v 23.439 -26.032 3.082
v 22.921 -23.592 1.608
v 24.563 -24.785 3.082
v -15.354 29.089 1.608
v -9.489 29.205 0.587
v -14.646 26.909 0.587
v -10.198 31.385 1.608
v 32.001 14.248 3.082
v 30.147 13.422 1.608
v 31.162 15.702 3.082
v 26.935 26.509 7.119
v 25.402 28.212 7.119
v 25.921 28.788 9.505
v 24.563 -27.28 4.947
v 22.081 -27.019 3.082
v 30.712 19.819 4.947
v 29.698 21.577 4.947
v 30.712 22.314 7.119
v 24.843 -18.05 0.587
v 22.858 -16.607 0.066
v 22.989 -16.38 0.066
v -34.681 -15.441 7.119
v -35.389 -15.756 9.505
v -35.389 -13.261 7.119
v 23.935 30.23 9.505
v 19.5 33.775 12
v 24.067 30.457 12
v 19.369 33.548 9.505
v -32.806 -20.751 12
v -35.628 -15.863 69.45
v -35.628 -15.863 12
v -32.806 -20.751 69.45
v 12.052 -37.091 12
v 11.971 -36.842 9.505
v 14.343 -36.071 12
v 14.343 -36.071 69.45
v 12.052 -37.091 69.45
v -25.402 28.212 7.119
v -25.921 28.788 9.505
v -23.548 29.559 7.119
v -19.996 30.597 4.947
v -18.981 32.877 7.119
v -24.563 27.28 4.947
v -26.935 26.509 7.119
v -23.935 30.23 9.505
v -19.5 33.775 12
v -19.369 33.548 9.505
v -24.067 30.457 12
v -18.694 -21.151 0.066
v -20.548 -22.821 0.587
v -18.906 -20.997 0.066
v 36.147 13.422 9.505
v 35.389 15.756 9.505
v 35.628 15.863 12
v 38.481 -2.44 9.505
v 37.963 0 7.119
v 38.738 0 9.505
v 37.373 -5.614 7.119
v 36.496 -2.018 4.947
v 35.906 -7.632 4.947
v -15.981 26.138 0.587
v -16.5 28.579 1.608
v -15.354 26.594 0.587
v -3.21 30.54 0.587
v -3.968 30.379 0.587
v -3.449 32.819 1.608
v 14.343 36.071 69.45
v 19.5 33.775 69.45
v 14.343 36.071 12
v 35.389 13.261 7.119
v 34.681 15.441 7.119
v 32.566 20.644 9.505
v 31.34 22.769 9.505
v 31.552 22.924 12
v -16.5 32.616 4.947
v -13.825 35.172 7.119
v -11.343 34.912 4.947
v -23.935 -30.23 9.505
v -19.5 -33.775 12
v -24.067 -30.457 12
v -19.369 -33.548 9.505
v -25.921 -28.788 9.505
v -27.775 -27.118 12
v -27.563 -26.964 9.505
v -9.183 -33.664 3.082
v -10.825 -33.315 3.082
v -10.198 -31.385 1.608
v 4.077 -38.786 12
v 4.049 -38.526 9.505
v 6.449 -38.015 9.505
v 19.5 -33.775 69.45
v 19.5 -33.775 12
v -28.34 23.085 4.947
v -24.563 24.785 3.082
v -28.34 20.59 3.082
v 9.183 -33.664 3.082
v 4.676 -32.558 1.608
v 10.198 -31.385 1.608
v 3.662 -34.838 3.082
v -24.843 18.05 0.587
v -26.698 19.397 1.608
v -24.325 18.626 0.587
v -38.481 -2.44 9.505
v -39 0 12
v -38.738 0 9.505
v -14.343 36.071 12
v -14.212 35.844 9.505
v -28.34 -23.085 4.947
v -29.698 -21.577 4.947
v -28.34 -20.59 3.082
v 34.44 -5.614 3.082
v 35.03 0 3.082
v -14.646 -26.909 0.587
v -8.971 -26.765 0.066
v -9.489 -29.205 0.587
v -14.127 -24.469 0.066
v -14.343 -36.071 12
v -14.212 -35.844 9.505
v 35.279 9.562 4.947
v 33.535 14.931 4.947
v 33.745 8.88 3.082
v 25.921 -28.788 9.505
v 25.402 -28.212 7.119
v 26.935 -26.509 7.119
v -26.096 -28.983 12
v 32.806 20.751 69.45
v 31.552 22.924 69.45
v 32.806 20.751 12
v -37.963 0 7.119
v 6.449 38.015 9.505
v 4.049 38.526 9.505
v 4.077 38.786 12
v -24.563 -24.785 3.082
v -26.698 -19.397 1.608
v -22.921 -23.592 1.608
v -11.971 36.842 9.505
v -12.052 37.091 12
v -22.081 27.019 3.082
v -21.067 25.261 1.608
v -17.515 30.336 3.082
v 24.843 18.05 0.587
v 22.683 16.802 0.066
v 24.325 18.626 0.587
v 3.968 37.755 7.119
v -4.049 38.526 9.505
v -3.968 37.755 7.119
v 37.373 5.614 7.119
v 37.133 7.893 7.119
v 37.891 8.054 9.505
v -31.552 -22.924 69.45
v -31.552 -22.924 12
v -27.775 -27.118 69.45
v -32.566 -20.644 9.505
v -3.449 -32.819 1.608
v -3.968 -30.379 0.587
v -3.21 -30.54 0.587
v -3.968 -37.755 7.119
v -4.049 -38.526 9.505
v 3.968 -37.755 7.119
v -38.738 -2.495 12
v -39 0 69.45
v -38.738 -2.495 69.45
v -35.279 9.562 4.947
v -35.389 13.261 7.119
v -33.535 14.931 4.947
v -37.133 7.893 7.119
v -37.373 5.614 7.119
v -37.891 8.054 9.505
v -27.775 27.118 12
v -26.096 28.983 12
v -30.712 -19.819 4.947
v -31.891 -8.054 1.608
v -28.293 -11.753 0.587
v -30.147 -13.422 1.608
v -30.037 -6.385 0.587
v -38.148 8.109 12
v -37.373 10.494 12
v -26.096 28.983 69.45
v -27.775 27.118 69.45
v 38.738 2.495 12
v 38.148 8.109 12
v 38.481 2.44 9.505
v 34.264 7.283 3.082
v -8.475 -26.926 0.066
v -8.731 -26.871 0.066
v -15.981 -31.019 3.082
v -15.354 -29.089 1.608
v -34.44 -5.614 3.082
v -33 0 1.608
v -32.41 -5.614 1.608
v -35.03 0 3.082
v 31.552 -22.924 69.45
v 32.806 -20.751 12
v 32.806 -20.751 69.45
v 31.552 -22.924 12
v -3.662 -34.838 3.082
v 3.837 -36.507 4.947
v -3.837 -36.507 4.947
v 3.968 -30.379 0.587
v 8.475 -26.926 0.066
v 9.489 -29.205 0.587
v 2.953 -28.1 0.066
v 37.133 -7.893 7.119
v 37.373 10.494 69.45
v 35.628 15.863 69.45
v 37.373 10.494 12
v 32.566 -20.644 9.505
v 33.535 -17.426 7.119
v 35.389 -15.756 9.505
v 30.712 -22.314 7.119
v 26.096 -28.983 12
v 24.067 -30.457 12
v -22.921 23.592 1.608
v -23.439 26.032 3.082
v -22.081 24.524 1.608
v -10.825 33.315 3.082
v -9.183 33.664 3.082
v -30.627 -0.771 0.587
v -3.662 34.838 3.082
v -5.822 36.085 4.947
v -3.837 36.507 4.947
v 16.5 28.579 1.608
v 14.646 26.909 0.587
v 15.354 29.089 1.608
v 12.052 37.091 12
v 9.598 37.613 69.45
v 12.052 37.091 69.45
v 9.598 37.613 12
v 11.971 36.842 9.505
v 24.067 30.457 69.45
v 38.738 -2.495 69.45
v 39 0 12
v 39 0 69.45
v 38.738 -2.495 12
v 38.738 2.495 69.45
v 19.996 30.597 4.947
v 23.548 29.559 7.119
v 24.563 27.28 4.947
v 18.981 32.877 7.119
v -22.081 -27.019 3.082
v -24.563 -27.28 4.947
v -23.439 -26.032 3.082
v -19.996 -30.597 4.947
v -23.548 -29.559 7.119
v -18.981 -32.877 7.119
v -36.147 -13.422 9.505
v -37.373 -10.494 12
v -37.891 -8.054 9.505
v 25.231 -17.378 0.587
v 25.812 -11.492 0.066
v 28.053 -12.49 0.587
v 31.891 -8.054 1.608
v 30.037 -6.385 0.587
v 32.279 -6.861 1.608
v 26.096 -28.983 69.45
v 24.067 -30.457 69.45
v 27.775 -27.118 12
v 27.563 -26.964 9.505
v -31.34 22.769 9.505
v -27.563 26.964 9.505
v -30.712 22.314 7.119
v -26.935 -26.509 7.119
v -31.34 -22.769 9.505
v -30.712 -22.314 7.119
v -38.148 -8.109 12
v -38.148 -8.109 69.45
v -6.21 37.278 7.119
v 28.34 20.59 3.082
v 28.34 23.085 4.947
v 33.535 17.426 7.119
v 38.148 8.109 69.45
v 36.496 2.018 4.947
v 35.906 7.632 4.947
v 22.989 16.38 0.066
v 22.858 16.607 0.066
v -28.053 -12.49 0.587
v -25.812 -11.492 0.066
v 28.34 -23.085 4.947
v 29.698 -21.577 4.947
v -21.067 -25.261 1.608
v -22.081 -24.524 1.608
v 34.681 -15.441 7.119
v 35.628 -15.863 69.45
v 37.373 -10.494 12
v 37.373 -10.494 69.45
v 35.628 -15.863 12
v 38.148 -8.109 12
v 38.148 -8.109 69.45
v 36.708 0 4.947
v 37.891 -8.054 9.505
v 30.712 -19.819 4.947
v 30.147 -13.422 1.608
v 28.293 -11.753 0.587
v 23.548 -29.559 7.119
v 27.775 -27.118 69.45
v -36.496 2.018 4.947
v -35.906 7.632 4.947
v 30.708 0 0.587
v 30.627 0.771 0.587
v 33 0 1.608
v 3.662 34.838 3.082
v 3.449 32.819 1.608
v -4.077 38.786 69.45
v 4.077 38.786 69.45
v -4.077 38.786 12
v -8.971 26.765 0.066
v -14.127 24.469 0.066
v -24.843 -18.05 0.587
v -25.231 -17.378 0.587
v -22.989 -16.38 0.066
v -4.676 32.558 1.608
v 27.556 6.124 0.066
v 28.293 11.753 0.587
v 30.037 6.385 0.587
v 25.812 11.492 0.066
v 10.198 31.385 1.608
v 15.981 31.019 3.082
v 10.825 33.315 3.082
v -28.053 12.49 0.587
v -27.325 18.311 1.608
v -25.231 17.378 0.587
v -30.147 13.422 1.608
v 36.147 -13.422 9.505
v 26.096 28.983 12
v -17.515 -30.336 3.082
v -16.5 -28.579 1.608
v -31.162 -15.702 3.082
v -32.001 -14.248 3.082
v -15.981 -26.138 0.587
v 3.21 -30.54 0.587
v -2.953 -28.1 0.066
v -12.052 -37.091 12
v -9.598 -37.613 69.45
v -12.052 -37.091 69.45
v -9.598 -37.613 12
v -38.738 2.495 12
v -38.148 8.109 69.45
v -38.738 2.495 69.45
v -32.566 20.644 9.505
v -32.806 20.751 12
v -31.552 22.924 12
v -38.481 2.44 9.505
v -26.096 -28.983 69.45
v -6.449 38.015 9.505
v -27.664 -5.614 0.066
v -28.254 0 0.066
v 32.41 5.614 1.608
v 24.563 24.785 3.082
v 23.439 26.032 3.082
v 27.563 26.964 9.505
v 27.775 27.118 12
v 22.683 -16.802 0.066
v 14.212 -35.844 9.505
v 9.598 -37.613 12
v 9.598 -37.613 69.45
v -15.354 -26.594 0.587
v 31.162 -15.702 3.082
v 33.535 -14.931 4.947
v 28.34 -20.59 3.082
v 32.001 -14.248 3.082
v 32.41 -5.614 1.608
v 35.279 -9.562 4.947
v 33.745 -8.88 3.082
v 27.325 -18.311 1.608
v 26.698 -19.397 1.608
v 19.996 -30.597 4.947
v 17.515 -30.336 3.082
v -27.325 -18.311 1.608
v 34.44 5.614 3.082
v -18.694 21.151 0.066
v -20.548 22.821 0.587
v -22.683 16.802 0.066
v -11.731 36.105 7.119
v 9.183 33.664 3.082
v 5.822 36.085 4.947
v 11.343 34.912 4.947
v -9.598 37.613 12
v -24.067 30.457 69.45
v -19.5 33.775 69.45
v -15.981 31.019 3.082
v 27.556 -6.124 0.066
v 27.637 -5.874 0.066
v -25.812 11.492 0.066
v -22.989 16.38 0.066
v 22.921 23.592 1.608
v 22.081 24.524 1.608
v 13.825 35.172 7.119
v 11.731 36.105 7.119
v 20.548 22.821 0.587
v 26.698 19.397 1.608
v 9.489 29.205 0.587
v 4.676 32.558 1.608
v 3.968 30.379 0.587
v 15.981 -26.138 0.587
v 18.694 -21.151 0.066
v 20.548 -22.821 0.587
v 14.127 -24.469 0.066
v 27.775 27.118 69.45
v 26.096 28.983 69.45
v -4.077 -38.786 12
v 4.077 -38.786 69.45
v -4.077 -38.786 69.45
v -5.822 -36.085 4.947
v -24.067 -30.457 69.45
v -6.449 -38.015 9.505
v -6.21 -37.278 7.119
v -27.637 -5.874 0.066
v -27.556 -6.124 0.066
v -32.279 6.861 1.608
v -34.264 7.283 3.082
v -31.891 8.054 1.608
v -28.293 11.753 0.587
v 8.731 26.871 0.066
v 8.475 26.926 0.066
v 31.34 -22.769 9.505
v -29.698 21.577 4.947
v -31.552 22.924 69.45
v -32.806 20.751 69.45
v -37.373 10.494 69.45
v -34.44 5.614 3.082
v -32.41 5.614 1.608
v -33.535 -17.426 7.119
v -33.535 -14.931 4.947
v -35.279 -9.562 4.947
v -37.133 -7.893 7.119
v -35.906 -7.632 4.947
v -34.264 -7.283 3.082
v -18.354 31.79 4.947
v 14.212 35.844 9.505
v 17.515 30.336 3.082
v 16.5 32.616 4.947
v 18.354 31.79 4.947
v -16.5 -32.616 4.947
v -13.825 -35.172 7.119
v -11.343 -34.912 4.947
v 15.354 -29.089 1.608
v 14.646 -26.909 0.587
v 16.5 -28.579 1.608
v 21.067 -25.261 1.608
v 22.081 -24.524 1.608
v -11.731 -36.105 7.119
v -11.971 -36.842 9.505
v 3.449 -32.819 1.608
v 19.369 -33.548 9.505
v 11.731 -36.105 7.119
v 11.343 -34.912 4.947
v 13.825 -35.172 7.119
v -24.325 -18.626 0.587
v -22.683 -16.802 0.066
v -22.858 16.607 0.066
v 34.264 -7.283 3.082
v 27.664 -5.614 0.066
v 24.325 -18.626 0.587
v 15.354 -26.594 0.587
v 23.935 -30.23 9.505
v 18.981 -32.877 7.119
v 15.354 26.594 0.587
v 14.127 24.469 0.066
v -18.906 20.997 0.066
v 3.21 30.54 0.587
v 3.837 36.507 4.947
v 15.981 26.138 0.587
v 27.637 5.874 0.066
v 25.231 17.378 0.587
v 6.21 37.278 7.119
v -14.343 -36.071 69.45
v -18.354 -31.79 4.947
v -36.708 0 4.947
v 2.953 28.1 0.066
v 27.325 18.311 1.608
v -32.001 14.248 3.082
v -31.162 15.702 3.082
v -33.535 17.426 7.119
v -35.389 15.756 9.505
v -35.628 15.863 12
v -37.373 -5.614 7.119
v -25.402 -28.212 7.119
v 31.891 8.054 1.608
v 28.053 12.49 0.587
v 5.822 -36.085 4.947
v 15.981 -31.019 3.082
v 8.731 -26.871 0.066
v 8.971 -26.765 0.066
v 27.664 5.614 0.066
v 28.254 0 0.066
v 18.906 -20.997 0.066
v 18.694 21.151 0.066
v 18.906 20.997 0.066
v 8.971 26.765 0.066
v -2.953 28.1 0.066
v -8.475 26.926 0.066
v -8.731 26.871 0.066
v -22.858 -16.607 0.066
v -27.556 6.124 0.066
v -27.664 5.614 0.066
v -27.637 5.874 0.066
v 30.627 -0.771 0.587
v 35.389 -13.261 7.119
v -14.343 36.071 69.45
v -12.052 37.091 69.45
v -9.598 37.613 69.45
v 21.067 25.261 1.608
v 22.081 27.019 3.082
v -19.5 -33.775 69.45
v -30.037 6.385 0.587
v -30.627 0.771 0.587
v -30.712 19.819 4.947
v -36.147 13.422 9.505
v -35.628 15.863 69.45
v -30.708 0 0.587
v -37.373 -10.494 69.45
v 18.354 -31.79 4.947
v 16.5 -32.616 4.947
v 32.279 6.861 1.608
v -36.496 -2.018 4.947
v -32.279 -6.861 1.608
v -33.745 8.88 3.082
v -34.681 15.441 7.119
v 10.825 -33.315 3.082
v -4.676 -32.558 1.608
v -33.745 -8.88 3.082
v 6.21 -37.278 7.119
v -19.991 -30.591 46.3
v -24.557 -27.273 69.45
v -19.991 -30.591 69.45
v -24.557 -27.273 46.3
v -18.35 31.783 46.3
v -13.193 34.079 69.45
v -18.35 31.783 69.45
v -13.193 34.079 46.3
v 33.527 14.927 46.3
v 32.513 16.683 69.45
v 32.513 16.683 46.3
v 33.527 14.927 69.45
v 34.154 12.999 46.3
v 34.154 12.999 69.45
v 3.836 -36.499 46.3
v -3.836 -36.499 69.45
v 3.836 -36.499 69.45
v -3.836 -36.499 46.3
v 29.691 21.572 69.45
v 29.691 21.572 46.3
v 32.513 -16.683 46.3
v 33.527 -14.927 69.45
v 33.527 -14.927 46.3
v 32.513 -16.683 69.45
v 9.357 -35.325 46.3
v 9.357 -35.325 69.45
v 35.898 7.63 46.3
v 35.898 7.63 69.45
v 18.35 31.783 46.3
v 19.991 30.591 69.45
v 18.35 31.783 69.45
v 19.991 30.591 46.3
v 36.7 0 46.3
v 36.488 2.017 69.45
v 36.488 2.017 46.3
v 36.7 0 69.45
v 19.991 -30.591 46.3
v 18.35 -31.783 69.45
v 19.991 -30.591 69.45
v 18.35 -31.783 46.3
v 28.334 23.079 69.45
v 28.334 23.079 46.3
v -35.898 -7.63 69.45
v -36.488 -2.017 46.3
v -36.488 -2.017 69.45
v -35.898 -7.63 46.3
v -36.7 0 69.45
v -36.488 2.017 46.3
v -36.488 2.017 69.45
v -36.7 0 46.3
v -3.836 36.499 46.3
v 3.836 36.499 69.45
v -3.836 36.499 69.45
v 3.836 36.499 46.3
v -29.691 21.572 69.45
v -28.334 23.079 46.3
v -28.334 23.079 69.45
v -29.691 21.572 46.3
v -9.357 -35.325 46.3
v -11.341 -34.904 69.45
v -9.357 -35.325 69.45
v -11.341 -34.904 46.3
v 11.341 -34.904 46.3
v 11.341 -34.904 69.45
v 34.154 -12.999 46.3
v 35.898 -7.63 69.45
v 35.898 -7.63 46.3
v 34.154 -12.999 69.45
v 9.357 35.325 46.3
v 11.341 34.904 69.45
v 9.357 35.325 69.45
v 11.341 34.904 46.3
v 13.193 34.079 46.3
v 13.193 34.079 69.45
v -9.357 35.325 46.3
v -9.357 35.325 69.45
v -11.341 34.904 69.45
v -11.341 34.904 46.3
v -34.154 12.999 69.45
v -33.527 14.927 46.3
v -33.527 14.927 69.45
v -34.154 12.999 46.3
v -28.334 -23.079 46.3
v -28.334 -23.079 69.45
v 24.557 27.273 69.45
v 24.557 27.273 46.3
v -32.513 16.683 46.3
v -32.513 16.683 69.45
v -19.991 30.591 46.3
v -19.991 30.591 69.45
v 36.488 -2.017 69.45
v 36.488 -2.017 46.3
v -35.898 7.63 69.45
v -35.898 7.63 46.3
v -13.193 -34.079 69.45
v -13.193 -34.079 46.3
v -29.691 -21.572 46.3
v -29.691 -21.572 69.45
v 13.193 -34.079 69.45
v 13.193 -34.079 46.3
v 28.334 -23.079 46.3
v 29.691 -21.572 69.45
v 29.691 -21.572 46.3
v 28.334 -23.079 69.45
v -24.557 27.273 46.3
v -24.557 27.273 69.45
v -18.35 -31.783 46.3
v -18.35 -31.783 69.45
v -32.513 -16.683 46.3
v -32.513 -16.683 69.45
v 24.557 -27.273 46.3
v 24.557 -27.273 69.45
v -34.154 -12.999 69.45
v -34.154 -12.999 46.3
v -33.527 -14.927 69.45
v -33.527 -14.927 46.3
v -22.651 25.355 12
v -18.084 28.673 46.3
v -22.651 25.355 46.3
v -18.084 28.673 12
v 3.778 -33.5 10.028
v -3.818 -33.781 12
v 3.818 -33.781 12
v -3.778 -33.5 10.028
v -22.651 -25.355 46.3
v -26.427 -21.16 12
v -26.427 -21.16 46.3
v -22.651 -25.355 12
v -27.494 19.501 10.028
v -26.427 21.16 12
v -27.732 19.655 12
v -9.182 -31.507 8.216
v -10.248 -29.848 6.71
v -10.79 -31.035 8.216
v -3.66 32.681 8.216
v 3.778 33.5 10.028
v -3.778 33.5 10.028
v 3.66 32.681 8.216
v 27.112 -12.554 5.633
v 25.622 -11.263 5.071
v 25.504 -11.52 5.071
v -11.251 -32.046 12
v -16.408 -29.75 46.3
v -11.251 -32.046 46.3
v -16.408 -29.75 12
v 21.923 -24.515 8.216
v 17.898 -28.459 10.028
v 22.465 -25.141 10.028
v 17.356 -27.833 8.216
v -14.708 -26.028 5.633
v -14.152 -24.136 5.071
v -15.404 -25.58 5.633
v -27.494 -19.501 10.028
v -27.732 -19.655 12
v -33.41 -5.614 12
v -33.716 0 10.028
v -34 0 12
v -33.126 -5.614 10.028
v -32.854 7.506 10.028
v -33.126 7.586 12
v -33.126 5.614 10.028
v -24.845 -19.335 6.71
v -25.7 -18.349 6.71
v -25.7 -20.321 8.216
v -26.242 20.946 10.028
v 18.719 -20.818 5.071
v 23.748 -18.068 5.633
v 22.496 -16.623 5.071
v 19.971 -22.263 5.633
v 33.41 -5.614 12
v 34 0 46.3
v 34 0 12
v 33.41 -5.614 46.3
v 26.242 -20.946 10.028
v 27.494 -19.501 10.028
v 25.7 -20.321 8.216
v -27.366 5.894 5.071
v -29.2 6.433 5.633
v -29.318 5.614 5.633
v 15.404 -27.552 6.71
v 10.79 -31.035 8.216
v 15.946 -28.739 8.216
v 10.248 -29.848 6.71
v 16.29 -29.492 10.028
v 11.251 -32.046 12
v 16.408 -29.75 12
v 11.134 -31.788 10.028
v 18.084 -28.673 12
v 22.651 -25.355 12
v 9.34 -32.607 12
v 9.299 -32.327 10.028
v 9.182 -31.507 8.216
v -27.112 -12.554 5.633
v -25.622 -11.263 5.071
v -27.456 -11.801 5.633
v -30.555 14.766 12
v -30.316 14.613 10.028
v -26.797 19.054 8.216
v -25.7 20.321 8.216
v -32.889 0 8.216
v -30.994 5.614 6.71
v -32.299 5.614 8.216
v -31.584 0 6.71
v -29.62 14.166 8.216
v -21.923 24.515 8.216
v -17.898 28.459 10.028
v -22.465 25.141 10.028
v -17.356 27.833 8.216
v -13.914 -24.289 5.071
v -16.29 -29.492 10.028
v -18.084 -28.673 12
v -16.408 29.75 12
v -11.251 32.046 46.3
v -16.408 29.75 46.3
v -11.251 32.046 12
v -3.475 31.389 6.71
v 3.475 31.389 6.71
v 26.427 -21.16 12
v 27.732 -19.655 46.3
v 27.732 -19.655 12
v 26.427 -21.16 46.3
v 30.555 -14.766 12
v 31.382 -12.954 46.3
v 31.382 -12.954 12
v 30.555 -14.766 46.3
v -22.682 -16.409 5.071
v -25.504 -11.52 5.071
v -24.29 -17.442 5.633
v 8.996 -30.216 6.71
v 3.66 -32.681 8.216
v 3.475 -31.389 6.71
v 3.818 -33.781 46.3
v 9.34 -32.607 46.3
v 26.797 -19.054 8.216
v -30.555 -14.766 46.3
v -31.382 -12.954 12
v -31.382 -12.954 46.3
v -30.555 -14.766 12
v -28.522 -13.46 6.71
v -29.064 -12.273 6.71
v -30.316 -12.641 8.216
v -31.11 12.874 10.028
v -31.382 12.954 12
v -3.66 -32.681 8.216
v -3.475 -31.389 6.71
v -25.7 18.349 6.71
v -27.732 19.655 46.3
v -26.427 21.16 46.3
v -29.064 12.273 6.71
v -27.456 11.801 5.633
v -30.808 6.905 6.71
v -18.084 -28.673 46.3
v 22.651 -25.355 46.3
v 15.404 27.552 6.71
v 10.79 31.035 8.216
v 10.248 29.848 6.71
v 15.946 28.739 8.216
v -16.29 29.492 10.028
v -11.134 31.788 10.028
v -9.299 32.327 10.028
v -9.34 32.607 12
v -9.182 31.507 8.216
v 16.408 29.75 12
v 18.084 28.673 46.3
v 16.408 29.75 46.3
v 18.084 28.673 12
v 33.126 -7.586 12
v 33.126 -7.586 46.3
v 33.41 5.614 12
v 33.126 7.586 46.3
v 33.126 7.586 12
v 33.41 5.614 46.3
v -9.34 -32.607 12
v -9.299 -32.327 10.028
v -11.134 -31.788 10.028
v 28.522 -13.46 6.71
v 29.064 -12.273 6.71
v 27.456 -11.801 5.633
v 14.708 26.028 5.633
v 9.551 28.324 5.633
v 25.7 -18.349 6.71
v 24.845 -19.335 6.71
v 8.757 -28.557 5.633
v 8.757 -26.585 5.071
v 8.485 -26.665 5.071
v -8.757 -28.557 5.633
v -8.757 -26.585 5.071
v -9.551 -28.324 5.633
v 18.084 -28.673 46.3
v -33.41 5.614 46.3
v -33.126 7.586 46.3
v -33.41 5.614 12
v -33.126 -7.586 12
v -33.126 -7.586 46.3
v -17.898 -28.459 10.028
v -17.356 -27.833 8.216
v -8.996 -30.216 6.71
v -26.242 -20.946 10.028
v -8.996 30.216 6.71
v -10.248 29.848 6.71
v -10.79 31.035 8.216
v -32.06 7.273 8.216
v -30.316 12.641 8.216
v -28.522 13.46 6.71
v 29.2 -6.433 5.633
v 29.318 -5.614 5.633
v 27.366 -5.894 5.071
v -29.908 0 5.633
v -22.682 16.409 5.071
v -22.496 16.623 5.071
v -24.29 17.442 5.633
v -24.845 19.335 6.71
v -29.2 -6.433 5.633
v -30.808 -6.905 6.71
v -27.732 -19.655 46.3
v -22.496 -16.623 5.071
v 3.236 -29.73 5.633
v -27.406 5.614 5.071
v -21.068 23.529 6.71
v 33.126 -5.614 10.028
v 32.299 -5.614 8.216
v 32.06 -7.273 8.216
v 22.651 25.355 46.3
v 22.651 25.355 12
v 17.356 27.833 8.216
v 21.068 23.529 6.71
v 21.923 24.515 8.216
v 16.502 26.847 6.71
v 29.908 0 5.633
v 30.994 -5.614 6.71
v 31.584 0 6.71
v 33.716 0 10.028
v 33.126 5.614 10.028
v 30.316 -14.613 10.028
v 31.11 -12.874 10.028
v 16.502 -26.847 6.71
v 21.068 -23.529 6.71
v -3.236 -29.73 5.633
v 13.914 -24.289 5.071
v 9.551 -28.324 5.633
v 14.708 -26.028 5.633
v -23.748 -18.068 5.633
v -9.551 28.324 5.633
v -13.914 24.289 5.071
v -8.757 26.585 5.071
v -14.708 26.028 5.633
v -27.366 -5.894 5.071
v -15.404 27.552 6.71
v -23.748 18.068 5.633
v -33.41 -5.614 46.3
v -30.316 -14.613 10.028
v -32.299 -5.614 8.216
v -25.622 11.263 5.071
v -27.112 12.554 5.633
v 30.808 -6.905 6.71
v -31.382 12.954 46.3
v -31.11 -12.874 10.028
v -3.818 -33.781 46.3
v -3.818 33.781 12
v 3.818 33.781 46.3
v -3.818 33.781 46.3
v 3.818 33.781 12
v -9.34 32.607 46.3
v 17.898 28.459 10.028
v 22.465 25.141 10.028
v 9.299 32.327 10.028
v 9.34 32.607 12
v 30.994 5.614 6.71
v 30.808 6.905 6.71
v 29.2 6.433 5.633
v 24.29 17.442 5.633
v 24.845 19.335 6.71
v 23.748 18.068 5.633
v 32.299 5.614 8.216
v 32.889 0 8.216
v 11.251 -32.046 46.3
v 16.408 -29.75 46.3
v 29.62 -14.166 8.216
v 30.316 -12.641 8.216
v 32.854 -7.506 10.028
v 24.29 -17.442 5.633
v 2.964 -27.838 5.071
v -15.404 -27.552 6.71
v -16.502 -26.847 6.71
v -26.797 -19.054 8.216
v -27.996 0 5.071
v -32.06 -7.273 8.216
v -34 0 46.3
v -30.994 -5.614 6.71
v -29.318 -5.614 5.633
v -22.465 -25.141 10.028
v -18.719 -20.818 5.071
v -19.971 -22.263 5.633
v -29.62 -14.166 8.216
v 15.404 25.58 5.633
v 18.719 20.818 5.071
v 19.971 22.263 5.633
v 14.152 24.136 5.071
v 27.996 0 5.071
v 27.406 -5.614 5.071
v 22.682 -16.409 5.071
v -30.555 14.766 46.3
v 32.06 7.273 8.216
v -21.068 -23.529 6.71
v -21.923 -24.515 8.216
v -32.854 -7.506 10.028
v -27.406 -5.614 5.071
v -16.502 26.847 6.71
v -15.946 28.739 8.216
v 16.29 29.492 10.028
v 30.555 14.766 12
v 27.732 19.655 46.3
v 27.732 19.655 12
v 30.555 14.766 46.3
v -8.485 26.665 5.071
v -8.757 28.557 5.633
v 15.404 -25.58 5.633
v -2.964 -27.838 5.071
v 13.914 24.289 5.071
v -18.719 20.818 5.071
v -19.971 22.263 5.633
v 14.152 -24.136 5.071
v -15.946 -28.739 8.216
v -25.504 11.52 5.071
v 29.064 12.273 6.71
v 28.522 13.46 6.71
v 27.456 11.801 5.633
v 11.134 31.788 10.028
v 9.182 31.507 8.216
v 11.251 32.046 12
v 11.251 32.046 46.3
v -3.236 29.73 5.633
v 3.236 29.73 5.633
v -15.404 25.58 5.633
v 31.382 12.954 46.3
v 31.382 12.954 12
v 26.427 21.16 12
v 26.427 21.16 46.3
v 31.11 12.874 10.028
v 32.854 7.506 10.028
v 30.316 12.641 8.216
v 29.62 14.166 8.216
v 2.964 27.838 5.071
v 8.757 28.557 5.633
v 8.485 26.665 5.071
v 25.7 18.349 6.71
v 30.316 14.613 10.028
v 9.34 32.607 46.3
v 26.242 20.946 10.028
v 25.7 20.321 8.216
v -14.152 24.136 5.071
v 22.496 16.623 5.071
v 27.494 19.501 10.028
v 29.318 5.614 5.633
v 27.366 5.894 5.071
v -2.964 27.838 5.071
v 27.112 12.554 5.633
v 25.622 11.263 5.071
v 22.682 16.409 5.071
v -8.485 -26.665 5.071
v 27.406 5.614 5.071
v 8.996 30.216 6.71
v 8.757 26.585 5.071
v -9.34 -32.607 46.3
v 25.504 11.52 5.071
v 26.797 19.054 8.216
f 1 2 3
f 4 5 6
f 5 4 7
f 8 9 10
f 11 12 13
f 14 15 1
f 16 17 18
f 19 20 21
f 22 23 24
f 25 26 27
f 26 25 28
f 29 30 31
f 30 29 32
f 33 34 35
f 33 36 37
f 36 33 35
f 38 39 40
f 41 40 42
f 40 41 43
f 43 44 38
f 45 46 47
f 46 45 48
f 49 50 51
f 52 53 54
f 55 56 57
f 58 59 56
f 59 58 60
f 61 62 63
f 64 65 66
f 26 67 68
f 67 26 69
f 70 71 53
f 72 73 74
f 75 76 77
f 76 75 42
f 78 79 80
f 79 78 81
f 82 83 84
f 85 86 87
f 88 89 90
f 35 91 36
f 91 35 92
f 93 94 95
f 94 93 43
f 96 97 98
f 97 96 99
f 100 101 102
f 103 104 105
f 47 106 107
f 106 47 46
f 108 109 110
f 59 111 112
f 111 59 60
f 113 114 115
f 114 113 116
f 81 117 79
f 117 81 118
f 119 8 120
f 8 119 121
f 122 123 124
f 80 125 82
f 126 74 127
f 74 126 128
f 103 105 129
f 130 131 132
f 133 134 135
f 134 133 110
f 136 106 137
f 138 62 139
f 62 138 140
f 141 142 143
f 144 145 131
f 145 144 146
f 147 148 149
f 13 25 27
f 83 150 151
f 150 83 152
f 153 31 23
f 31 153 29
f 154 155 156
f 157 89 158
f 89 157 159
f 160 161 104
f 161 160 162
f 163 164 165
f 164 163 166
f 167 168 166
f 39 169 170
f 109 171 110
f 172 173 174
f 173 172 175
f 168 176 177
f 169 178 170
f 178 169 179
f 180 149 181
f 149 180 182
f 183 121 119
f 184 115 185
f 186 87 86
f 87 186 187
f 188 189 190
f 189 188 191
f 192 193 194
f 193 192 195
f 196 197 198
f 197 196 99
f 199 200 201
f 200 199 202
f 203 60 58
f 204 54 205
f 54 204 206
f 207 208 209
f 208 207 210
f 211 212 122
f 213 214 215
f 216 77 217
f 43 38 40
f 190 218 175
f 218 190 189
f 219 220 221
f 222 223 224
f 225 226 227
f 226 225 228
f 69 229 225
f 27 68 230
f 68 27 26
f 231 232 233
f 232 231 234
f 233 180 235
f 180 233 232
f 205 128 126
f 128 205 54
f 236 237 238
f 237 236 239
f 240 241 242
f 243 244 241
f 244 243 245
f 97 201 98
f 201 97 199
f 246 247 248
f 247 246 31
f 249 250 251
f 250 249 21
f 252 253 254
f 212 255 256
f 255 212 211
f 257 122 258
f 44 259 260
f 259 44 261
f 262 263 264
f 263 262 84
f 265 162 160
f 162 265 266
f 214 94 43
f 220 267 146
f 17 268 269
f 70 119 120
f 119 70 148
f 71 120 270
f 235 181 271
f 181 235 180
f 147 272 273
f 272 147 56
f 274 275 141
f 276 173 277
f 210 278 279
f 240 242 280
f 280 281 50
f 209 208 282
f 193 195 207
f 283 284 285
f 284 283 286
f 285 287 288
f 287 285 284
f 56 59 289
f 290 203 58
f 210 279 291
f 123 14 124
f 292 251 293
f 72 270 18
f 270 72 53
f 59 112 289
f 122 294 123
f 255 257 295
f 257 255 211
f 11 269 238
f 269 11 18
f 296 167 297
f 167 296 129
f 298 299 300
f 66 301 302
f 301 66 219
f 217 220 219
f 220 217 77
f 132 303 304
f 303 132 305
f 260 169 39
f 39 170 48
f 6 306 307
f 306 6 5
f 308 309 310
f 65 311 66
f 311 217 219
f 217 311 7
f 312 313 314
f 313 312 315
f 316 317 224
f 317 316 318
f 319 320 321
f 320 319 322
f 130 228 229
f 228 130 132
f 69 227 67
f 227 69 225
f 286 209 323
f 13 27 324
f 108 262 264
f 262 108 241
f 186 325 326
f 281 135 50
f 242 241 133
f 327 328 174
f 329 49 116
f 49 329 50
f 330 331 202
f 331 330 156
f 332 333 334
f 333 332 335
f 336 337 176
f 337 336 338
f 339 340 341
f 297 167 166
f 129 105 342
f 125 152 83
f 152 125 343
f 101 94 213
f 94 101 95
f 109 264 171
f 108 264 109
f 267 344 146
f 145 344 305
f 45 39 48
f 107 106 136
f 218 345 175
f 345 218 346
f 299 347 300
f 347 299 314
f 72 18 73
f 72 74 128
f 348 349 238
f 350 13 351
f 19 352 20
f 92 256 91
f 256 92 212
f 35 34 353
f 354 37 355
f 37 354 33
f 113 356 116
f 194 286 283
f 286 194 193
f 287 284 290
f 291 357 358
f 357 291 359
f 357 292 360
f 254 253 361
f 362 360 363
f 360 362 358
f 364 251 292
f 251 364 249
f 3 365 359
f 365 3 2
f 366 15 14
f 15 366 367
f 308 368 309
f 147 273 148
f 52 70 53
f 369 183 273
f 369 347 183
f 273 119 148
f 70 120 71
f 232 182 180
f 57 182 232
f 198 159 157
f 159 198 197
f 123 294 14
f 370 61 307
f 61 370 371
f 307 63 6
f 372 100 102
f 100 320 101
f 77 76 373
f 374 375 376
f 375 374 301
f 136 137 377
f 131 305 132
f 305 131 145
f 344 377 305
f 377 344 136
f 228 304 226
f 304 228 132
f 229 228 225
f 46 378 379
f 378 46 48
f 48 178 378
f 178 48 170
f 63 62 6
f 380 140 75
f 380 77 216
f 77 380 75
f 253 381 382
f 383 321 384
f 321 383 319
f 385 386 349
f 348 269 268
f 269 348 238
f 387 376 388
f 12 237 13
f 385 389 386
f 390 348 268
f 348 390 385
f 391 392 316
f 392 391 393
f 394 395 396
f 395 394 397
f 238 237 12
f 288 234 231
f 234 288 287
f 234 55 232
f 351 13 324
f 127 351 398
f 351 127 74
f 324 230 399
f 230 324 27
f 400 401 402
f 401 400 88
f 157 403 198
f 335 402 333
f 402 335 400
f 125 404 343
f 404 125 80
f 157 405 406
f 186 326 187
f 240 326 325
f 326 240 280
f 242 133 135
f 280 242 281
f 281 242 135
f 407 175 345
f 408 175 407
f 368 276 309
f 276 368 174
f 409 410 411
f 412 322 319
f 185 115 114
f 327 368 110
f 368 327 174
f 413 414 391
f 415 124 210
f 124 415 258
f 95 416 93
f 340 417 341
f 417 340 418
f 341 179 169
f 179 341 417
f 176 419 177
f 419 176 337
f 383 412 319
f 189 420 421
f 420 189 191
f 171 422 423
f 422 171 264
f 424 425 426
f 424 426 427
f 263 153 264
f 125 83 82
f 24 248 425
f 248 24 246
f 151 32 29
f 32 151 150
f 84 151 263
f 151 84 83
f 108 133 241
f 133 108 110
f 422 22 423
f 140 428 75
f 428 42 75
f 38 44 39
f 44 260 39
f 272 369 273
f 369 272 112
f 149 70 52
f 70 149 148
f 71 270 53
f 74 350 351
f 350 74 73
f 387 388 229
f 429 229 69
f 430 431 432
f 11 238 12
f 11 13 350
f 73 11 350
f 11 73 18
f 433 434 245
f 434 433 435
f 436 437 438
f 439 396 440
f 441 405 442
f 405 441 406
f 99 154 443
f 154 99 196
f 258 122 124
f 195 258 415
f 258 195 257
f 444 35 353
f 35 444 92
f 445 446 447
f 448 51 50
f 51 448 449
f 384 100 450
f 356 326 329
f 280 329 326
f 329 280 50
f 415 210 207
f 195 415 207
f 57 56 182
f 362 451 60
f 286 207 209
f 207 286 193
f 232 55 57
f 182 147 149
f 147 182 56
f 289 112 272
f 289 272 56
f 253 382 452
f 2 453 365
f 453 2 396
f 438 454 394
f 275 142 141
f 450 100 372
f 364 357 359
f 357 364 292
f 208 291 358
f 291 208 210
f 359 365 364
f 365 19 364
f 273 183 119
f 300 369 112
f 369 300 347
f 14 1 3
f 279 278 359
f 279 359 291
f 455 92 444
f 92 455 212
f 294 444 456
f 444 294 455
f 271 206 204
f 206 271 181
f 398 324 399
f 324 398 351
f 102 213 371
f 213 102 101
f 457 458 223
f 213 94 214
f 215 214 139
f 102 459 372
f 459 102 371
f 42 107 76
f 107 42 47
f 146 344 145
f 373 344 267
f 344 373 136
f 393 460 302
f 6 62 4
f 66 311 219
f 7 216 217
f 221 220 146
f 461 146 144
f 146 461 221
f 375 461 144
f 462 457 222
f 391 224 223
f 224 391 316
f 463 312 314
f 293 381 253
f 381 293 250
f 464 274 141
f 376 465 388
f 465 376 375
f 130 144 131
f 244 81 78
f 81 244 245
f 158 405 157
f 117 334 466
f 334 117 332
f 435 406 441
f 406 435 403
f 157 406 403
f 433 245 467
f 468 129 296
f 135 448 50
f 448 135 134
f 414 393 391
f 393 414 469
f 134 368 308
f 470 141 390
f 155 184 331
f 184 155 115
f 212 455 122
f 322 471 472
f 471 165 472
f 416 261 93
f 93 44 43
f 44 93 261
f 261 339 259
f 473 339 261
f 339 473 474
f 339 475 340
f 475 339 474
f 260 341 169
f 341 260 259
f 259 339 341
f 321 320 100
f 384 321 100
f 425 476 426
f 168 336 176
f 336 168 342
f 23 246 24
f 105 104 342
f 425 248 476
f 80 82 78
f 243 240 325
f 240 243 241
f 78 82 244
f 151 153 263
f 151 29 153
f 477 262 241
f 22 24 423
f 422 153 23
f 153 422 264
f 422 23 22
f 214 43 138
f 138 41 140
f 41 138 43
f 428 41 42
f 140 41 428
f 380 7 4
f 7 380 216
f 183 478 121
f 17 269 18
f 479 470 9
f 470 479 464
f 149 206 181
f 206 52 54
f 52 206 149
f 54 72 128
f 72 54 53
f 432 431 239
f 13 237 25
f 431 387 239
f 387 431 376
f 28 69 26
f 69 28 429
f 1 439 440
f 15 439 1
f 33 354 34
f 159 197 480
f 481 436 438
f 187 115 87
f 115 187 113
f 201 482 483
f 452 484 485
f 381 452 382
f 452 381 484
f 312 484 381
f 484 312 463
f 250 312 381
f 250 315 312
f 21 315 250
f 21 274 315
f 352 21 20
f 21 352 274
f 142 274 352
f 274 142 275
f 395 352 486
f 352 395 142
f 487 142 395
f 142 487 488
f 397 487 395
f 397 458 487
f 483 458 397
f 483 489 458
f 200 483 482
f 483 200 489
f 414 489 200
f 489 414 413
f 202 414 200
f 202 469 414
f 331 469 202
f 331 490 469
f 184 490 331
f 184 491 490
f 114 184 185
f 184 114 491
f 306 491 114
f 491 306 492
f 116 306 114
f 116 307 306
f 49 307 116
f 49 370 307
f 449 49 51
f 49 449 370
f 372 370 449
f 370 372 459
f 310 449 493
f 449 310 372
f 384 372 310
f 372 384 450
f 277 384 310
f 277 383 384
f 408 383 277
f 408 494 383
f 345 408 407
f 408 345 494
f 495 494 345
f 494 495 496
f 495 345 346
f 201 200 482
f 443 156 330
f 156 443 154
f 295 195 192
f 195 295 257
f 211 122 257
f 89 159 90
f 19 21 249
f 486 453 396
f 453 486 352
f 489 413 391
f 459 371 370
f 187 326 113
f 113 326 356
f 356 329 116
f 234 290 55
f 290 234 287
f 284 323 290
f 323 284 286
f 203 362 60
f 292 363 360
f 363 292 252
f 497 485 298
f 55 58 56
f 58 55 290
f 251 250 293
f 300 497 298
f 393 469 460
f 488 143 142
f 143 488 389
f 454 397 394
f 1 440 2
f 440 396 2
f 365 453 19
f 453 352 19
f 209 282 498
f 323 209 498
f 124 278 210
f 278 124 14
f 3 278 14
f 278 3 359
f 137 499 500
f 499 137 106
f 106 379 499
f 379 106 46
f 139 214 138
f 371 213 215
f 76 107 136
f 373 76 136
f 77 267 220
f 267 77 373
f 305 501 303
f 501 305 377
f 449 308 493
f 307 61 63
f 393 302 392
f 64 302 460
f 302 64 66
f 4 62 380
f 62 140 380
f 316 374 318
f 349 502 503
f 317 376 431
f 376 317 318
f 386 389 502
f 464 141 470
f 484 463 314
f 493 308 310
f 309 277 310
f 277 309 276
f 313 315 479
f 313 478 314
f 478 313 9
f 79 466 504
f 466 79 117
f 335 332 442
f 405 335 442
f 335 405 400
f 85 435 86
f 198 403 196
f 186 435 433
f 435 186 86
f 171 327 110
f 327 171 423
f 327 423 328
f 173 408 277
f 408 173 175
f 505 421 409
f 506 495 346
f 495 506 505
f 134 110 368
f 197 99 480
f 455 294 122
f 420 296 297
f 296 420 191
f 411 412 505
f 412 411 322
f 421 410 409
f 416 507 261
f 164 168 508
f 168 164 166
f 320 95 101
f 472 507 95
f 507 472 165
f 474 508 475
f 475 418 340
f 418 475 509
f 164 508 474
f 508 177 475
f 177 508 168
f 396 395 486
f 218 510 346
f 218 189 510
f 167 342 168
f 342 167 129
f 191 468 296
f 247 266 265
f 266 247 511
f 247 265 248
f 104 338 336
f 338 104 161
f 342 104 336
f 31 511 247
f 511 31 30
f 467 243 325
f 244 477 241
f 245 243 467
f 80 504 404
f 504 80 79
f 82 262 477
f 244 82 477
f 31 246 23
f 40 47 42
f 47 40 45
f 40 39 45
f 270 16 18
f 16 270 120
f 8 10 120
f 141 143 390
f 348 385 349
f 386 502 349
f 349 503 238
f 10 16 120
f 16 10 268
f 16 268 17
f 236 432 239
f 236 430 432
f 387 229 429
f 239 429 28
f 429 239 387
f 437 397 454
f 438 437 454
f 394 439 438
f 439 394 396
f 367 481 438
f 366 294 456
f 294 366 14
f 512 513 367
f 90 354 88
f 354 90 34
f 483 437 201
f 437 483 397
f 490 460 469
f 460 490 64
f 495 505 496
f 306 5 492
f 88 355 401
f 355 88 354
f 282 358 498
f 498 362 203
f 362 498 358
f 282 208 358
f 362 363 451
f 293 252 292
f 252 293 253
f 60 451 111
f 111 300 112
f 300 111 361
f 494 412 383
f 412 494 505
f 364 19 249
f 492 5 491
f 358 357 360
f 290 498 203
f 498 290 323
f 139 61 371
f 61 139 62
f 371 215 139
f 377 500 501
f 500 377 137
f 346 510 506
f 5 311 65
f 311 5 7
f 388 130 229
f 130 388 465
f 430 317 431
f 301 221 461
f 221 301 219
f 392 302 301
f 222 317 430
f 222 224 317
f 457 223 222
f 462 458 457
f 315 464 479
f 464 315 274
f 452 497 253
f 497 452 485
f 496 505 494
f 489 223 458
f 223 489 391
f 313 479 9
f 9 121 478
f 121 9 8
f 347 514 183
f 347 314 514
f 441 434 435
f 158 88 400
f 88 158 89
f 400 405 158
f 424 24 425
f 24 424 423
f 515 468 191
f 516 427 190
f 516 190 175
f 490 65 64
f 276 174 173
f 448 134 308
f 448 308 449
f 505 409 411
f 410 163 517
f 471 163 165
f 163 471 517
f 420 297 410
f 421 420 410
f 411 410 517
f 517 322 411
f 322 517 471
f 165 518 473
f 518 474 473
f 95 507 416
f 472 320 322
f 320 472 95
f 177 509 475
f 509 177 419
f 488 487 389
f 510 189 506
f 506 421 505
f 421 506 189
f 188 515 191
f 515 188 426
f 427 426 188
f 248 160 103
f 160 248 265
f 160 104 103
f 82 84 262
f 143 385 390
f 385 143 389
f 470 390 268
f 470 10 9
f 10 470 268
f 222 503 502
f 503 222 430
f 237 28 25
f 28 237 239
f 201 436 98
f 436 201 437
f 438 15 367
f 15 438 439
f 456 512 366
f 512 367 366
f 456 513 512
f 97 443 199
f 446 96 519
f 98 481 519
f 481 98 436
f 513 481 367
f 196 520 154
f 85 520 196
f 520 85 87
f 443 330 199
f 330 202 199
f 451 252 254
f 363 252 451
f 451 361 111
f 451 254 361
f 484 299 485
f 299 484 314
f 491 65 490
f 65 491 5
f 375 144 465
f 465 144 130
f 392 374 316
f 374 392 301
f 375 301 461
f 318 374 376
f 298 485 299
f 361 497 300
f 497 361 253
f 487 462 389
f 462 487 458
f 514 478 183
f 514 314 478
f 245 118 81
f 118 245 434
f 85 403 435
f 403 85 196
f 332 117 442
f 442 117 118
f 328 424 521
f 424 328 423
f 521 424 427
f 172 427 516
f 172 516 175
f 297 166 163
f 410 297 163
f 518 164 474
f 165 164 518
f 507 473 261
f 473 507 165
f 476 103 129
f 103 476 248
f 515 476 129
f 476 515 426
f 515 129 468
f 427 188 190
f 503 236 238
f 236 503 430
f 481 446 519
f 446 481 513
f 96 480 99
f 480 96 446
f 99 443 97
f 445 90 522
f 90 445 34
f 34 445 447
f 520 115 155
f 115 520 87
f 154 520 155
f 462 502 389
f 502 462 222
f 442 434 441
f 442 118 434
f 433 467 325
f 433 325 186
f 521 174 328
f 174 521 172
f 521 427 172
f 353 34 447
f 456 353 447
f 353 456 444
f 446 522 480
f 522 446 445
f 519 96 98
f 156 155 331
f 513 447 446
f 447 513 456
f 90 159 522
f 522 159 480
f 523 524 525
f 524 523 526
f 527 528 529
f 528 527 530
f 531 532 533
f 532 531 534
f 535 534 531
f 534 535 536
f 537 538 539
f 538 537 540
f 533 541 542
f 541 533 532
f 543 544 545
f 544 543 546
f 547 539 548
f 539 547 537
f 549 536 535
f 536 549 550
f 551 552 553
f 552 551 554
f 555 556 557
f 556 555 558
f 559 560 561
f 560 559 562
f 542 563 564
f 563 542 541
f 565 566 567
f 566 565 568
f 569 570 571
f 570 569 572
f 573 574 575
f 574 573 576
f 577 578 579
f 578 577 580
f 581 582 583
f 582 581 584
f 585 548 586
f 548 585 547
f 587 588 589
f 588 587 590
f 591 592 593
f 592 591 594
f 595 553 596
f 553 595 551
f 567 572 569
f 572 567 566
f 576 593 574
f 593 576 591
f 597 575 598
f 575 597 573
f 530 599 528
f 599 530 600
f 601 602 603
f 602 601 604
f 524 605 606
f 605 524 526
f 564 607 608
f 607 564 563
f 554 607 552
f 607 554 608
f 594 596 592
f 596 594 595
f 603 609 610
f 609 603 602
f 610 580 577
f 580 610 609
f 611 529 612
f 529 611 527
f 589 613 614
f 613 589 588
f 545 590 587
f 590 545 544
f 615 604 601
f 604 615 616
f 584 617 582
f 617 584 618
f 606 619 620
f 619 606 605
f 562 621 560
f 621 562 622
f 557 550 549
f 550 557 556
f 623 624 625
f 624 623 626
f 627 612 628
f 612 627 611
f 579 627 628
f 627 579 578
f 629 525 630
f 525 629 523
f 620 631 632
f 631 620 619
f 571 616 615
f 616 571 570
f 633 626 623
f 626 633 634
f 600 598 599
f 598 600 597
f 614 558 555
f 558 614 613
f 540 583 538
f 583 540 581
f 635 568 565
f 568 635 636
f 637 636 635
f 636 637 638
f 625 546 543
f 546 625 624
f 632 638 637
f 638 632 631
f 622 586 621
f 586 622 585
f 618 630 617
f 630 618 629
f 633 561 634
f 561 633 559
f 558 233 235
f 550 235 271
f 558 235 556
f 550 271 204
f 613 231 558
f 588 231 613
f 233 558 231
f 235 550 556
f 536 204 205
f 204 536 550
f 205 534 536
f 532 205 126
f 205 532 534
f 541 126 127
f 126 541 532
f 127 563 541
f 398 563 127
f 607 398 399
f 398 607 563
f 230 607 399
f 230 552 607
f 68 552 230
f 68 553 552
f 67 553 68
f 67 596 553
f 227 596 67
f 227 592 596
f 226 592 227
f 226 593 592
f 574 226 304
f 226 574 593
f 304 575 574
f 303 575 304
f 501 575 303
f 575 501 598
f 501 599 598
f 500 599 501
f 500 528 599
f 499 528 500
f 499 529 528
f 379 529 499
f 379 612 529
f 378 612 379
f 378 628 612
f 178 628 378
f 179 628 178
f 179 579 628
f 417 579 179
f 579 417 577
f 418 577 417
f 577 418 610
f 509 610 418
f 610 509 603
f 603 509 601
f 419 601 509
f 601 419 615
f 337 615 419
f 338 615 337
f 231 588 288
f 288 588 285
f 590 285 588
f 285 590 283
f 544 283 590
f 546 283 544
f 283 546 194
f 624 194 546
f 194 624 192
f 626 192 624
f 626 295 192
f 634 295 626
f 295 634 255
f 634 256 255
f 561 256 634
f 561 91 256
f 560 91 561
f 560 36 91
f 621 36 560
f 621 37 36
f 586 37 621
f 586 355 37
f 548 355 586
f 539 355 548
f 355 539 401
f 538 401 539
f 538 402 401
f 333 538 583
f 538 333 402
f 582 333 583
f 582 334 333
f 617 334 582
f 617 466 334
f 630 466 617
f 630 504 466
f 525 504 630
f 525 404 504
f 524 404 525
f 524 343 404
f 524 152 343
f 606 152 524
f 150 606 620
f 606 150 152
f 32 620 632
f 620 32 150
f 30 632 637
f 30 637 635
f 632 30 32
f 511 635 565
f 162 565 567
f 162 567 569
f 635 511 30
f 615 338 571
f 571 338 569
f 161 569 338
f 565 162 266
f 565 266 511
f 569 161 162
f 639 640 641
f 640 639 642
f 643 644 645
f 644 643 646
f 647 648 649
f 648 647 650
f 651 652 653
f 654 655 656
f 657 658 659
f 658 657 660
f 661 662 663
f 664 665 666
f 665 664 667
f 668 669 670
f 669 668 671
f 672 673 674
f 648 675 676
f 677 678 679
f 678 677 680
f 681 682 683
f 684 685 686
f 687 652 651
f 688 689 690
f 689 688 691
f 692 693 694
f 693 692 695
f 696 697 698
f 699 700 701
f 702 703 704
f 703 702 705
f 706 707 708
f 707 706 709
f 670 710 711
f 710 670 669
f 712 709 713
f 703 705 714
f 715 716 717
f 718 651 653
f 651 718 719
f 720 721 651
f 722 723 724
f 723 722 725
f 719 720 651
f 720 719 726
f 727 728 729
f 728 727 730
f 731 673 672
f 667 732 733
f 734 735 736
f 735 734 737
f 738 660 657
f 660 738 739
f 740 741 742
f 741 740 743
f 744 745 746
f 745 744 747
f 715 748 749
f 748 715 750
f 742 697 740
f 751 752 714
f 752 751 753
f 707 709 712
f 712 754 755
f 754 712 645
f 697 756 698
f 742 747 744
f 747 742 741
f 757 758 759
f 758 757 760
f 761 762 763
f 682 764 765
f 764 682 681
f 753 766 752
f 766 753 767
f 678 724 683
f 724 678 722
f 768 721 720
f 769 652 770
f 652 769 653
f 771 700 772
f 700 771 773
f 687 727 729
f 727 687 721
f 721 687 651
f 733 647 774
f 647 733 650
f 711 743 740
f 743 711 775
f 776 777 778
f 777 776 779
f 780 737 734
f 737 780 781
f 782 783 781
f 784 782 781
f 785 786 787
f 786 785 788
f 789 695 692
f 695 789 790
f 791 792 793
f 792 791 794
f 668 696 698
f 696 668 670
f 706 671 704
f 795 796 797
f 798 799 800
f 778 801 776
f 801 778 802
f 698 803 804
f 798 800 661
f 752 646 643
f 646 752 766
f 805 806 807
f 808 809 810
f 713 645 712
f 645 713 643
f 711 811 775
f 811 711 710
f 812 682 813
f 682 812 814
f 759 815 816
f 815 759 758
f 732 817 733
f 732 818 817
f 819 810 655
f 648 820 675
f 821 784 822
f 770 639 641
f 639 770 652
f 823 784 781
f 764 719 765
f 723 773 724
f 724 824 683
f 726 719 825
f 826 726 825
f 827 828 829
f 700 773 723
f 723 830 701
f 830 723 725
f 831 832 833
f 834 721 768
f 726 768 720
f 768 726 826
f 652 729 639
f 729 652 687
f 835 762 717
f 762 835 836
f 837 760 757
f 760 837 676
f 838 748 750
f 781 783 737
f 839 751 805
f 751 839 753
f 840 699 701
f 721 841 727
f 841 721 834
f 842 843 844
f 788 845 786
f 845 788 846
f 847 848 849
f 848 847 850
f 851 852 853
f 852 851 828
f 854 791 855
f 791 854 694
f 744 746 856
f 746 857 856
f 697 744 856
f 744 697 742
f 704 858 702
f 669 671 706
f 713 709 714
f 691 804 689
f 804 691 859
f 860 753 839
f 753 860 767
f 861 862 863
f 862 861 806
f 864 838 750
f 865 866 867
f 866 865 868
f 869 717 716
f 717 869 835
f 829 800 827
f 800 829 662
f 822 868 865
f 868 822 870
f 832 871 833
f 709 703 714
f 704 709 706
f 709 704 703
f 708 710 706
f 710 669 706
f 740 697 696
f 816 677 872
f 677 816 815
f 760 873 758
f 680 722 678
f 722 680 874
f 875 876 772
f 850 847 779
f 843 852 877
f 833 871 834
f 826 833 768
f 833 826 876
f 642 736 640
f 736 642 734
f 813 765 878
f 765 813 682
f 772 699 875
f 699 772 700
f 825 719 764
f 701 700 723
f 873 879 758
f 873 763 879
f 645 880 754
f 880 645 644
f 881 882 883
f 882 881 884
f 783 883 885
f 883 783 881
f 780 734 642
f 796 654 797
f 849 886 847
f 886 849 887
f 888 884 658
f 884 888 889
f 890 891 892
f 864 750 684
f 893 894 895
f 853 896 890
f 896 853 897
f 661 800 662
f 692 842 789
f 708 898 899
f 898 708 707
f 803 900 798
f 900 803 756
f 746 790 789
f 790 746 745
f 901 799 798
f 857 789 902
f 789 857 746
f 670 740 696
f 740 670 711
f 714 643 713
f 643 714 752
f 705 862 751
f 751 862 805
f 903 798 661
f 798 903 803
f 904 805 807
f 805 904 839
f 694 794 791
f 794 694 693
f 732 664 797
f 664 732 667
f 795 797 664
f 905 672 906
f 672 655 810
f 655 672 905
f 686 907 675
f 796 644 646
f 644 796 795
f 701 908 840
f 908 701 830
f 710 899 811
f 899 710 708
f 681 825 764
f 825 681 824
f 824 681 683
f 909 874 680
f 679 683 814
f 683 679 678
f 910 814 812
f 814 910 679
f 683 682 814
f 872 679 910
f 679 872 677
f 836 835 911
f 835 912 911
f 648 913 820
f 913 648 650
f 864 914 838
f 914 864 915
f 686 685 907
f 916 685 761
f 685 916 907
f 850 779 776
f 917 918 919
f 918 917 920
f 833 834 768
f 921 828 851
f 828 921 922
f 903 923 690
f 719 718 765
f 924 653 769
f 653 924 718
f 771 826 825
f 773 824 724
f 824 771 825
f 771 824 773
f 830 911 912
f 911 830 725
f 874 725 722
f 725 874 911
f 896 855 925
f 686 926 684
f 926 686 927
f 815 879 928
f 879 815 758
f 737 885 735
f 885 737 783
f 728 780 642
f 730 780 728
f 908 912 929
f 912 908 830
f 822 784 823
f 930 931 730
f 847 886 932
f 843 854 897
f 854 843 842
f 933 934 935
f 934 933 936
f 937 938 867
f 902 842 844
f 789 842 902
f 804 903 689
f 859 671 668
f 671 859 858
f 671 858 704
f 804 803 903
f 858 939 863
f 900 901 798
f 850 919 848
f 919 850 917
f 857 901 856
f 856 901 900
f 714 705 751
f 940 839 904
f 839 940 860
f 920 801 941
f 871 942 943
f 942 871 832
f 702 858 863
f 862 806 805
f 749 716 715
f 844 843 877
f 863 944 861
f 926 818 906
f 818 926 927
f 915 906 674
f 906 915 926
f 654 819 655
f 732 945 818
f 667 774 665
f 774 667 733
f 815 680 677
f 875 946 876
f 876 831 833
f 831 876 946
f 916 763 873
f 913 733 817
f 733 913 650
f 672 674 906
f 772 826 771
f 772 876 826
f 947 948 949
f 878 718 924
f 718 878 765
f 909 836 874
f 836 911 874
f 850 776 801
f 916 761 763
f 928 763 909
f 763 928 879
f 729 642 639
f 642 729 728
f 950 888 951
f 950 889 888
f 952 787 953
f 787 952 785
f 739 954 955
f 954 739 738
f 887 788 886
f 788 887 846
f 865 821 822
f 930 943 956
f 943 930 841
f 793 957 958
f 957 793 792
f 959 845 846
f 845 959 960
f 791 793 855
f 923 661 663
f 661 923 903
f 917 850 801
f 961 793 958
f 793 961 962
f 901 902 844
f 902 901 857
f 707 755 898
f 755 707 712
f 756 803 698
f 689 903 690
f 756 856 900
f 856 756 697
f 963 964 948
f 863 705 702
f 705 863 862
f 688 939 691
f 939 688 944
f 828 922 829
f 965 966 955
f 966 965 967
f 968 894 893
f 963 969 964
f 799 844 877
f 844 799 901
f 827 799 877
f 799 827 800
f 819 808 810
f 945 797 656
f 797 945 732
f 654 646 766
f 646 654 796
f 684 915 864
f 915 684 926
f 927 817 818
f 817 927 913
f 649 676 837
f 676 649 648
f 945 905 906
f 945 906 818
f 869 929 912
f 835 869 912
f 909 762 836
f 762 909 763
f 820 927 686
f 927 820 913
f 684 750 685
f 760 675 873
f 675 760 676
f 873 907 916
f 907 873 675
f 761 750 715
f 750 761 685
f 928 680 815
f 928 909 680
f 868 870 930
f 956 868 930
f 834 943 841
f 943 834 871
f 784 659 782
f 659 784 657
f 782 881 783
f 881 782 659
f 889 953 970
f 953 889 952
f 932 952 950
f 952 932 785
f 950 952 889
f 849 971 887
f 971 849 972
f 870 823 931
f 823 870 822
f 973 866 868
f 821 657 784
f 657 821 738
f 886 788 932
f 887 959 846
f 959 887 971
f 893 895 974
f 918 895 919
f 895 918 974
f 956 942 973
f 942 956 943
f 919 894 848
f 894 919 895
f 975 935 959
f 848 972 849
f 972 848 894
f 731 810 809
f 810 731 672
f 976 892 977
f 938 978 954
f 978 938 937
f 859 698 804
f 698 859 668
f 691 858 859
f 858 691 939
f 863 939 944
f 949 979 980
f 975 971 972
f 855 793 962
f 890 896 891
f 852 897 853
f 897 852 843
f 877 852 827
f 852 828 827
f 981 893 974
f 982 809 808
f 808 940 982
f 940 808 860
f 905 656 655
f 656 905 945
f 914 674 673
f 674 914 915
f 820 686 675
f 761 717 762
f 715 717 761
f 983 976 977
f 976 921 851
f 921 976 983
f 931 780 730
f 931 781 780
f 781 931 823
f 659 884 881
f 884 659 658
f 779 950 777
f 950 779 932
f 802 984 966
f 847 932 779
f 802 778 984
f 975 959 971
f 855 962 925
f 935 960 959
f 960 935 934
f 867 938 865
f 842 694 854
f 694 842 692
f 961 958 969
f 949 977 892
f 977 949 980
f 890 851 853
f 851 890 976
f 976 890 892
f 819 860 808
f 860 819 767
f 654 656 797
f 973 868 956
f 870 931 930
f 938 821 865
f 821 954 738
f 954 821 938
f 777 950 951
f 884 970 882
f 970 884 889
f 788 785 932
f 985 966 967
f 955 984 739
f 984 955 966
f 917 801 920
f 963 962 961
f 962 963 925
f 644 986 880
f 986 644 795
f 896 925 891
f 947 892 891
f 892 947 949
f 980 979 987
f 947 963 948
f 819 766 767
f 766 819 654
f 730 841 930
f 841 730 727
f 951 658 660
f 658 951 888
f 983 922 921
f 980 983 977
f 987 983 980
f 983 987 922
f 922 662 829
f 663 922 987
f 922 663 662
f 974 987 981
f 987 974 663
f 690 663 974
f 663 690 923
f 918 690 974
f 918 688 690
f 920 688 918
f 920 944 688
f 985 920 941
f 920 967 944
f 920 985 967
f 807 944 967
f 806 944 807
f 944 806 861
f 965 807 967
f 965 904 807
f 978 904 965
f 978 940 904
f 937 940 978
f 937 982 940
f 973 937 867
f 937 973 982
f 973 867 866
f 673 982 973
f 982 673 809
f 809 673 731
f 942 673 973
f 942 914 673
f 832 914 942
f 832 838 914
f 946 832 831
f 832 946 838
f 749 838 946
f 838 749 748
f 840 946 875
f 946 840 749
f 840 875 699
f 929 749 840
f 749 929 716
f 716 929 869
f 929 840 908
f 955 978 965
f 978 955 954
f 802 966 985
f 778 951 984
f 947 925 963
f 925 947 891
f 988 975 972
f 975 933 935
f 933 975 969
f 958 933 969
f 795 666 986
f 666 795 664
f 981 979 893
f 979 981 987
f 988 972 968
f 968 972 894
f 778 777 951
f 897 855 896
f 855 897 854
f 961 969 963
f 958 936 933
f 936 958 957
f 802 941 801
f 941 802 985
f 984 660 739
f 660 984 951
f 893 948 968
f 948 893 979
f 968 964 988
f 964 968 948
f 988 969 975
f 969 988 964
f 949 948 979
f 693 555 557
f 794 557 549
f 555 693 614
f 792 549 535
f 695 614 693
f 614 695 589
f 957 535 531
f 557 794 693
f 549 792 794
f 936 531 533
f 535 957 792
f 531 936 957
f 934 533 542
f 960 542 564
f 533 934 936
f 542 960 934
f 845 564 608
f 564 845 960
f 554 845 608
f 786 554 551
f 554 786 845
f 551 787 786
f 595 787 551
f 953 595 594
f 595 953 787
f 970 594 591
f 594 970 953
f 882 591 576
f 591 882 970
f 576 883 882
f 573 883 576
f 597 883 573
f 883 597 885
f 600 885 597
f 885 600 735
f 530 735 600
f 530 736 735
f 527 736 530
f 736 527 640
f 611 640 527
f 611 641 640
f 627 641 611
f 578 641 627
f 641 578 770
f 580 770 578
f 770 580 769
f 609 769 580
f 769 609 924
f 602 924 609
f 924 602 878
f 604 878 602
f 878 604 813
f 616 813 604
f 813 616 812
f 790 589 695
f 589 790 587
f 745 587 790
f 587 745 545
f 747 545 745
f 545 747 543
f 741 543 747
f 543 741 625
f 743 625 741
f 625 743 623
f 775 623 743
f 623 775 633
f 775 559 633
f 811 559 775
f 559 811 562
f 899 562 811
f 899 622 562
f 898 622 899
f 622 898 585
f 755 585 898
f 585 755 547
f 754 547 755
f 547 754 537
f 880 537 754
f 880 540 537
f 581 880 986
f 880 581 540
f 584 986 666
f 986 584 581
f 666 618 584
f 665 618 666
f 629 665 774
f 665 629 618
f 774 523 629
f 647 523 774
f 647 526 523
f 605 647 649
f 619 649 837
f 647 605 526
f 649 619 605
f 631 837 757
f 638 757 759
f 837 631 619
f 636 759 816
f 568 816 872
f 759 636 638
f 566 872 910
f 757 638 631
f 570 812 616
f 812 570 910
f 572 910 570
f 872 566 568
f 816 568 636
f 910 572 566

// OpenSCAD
hj=82.2;      //jar height
dj=67.3;      //jar diameter
rj=7;         //jar edge radius

nd=0.4;       //nozzle diameter
fl=0.2;       //first layer height
lh=0.2;       //print layer height

tw=5;         //wall thickness
fn=0;         //finish finenss

jlr=0.25;     //jar-lid ratio of total height

d=(floor(dj/nd)+2)*nd; echo(d);
h=(floor((hj-fl)/lh)+2)*lh+fl; echo(h);

union()
{
    
    difference()
    {
        
        translate([0,0,rj+tw])
        minkowski()
        {
            cylinder(h=h-2*rj,d=d-2*rj,$fn=fn);
            sphere(r=rj+tw,$fn=fn);
        }; 

        translate([0,0,rj+tw])
        minkowski()
        {
            cylinder(h=h-2*rj,d=d-2*rj,$fn=fn);
            sphere(r=rj+tw/2+nd/2,$fn=fn);
        };
        
        translate([0,0,(1-jlr)*(h+2*tw)])
        cylinder(h=h,d=d+rj+2*tw);;
    };

    difference()
    {
        
        translate([0,0,rj+tw])
        minkowski()
        {
            cylinder(h=h-2*rj,d=d-2*rj,$fn=fn);
            sphere(r=rj+tw,$fn=fn);
        }; 

        translate([0,0,rj+tw])
        minkowski()
        {
            cylinder(h=h-2*rj,d=d-2*rj,$fn=fn);
            sphere(r=rj,$fn=fn);
        };
        
        translate([0,0,(1-0.5)*(h+2*tw)])
        cylinder(h=h,d=d+rj+2*tw);;
    };
};
